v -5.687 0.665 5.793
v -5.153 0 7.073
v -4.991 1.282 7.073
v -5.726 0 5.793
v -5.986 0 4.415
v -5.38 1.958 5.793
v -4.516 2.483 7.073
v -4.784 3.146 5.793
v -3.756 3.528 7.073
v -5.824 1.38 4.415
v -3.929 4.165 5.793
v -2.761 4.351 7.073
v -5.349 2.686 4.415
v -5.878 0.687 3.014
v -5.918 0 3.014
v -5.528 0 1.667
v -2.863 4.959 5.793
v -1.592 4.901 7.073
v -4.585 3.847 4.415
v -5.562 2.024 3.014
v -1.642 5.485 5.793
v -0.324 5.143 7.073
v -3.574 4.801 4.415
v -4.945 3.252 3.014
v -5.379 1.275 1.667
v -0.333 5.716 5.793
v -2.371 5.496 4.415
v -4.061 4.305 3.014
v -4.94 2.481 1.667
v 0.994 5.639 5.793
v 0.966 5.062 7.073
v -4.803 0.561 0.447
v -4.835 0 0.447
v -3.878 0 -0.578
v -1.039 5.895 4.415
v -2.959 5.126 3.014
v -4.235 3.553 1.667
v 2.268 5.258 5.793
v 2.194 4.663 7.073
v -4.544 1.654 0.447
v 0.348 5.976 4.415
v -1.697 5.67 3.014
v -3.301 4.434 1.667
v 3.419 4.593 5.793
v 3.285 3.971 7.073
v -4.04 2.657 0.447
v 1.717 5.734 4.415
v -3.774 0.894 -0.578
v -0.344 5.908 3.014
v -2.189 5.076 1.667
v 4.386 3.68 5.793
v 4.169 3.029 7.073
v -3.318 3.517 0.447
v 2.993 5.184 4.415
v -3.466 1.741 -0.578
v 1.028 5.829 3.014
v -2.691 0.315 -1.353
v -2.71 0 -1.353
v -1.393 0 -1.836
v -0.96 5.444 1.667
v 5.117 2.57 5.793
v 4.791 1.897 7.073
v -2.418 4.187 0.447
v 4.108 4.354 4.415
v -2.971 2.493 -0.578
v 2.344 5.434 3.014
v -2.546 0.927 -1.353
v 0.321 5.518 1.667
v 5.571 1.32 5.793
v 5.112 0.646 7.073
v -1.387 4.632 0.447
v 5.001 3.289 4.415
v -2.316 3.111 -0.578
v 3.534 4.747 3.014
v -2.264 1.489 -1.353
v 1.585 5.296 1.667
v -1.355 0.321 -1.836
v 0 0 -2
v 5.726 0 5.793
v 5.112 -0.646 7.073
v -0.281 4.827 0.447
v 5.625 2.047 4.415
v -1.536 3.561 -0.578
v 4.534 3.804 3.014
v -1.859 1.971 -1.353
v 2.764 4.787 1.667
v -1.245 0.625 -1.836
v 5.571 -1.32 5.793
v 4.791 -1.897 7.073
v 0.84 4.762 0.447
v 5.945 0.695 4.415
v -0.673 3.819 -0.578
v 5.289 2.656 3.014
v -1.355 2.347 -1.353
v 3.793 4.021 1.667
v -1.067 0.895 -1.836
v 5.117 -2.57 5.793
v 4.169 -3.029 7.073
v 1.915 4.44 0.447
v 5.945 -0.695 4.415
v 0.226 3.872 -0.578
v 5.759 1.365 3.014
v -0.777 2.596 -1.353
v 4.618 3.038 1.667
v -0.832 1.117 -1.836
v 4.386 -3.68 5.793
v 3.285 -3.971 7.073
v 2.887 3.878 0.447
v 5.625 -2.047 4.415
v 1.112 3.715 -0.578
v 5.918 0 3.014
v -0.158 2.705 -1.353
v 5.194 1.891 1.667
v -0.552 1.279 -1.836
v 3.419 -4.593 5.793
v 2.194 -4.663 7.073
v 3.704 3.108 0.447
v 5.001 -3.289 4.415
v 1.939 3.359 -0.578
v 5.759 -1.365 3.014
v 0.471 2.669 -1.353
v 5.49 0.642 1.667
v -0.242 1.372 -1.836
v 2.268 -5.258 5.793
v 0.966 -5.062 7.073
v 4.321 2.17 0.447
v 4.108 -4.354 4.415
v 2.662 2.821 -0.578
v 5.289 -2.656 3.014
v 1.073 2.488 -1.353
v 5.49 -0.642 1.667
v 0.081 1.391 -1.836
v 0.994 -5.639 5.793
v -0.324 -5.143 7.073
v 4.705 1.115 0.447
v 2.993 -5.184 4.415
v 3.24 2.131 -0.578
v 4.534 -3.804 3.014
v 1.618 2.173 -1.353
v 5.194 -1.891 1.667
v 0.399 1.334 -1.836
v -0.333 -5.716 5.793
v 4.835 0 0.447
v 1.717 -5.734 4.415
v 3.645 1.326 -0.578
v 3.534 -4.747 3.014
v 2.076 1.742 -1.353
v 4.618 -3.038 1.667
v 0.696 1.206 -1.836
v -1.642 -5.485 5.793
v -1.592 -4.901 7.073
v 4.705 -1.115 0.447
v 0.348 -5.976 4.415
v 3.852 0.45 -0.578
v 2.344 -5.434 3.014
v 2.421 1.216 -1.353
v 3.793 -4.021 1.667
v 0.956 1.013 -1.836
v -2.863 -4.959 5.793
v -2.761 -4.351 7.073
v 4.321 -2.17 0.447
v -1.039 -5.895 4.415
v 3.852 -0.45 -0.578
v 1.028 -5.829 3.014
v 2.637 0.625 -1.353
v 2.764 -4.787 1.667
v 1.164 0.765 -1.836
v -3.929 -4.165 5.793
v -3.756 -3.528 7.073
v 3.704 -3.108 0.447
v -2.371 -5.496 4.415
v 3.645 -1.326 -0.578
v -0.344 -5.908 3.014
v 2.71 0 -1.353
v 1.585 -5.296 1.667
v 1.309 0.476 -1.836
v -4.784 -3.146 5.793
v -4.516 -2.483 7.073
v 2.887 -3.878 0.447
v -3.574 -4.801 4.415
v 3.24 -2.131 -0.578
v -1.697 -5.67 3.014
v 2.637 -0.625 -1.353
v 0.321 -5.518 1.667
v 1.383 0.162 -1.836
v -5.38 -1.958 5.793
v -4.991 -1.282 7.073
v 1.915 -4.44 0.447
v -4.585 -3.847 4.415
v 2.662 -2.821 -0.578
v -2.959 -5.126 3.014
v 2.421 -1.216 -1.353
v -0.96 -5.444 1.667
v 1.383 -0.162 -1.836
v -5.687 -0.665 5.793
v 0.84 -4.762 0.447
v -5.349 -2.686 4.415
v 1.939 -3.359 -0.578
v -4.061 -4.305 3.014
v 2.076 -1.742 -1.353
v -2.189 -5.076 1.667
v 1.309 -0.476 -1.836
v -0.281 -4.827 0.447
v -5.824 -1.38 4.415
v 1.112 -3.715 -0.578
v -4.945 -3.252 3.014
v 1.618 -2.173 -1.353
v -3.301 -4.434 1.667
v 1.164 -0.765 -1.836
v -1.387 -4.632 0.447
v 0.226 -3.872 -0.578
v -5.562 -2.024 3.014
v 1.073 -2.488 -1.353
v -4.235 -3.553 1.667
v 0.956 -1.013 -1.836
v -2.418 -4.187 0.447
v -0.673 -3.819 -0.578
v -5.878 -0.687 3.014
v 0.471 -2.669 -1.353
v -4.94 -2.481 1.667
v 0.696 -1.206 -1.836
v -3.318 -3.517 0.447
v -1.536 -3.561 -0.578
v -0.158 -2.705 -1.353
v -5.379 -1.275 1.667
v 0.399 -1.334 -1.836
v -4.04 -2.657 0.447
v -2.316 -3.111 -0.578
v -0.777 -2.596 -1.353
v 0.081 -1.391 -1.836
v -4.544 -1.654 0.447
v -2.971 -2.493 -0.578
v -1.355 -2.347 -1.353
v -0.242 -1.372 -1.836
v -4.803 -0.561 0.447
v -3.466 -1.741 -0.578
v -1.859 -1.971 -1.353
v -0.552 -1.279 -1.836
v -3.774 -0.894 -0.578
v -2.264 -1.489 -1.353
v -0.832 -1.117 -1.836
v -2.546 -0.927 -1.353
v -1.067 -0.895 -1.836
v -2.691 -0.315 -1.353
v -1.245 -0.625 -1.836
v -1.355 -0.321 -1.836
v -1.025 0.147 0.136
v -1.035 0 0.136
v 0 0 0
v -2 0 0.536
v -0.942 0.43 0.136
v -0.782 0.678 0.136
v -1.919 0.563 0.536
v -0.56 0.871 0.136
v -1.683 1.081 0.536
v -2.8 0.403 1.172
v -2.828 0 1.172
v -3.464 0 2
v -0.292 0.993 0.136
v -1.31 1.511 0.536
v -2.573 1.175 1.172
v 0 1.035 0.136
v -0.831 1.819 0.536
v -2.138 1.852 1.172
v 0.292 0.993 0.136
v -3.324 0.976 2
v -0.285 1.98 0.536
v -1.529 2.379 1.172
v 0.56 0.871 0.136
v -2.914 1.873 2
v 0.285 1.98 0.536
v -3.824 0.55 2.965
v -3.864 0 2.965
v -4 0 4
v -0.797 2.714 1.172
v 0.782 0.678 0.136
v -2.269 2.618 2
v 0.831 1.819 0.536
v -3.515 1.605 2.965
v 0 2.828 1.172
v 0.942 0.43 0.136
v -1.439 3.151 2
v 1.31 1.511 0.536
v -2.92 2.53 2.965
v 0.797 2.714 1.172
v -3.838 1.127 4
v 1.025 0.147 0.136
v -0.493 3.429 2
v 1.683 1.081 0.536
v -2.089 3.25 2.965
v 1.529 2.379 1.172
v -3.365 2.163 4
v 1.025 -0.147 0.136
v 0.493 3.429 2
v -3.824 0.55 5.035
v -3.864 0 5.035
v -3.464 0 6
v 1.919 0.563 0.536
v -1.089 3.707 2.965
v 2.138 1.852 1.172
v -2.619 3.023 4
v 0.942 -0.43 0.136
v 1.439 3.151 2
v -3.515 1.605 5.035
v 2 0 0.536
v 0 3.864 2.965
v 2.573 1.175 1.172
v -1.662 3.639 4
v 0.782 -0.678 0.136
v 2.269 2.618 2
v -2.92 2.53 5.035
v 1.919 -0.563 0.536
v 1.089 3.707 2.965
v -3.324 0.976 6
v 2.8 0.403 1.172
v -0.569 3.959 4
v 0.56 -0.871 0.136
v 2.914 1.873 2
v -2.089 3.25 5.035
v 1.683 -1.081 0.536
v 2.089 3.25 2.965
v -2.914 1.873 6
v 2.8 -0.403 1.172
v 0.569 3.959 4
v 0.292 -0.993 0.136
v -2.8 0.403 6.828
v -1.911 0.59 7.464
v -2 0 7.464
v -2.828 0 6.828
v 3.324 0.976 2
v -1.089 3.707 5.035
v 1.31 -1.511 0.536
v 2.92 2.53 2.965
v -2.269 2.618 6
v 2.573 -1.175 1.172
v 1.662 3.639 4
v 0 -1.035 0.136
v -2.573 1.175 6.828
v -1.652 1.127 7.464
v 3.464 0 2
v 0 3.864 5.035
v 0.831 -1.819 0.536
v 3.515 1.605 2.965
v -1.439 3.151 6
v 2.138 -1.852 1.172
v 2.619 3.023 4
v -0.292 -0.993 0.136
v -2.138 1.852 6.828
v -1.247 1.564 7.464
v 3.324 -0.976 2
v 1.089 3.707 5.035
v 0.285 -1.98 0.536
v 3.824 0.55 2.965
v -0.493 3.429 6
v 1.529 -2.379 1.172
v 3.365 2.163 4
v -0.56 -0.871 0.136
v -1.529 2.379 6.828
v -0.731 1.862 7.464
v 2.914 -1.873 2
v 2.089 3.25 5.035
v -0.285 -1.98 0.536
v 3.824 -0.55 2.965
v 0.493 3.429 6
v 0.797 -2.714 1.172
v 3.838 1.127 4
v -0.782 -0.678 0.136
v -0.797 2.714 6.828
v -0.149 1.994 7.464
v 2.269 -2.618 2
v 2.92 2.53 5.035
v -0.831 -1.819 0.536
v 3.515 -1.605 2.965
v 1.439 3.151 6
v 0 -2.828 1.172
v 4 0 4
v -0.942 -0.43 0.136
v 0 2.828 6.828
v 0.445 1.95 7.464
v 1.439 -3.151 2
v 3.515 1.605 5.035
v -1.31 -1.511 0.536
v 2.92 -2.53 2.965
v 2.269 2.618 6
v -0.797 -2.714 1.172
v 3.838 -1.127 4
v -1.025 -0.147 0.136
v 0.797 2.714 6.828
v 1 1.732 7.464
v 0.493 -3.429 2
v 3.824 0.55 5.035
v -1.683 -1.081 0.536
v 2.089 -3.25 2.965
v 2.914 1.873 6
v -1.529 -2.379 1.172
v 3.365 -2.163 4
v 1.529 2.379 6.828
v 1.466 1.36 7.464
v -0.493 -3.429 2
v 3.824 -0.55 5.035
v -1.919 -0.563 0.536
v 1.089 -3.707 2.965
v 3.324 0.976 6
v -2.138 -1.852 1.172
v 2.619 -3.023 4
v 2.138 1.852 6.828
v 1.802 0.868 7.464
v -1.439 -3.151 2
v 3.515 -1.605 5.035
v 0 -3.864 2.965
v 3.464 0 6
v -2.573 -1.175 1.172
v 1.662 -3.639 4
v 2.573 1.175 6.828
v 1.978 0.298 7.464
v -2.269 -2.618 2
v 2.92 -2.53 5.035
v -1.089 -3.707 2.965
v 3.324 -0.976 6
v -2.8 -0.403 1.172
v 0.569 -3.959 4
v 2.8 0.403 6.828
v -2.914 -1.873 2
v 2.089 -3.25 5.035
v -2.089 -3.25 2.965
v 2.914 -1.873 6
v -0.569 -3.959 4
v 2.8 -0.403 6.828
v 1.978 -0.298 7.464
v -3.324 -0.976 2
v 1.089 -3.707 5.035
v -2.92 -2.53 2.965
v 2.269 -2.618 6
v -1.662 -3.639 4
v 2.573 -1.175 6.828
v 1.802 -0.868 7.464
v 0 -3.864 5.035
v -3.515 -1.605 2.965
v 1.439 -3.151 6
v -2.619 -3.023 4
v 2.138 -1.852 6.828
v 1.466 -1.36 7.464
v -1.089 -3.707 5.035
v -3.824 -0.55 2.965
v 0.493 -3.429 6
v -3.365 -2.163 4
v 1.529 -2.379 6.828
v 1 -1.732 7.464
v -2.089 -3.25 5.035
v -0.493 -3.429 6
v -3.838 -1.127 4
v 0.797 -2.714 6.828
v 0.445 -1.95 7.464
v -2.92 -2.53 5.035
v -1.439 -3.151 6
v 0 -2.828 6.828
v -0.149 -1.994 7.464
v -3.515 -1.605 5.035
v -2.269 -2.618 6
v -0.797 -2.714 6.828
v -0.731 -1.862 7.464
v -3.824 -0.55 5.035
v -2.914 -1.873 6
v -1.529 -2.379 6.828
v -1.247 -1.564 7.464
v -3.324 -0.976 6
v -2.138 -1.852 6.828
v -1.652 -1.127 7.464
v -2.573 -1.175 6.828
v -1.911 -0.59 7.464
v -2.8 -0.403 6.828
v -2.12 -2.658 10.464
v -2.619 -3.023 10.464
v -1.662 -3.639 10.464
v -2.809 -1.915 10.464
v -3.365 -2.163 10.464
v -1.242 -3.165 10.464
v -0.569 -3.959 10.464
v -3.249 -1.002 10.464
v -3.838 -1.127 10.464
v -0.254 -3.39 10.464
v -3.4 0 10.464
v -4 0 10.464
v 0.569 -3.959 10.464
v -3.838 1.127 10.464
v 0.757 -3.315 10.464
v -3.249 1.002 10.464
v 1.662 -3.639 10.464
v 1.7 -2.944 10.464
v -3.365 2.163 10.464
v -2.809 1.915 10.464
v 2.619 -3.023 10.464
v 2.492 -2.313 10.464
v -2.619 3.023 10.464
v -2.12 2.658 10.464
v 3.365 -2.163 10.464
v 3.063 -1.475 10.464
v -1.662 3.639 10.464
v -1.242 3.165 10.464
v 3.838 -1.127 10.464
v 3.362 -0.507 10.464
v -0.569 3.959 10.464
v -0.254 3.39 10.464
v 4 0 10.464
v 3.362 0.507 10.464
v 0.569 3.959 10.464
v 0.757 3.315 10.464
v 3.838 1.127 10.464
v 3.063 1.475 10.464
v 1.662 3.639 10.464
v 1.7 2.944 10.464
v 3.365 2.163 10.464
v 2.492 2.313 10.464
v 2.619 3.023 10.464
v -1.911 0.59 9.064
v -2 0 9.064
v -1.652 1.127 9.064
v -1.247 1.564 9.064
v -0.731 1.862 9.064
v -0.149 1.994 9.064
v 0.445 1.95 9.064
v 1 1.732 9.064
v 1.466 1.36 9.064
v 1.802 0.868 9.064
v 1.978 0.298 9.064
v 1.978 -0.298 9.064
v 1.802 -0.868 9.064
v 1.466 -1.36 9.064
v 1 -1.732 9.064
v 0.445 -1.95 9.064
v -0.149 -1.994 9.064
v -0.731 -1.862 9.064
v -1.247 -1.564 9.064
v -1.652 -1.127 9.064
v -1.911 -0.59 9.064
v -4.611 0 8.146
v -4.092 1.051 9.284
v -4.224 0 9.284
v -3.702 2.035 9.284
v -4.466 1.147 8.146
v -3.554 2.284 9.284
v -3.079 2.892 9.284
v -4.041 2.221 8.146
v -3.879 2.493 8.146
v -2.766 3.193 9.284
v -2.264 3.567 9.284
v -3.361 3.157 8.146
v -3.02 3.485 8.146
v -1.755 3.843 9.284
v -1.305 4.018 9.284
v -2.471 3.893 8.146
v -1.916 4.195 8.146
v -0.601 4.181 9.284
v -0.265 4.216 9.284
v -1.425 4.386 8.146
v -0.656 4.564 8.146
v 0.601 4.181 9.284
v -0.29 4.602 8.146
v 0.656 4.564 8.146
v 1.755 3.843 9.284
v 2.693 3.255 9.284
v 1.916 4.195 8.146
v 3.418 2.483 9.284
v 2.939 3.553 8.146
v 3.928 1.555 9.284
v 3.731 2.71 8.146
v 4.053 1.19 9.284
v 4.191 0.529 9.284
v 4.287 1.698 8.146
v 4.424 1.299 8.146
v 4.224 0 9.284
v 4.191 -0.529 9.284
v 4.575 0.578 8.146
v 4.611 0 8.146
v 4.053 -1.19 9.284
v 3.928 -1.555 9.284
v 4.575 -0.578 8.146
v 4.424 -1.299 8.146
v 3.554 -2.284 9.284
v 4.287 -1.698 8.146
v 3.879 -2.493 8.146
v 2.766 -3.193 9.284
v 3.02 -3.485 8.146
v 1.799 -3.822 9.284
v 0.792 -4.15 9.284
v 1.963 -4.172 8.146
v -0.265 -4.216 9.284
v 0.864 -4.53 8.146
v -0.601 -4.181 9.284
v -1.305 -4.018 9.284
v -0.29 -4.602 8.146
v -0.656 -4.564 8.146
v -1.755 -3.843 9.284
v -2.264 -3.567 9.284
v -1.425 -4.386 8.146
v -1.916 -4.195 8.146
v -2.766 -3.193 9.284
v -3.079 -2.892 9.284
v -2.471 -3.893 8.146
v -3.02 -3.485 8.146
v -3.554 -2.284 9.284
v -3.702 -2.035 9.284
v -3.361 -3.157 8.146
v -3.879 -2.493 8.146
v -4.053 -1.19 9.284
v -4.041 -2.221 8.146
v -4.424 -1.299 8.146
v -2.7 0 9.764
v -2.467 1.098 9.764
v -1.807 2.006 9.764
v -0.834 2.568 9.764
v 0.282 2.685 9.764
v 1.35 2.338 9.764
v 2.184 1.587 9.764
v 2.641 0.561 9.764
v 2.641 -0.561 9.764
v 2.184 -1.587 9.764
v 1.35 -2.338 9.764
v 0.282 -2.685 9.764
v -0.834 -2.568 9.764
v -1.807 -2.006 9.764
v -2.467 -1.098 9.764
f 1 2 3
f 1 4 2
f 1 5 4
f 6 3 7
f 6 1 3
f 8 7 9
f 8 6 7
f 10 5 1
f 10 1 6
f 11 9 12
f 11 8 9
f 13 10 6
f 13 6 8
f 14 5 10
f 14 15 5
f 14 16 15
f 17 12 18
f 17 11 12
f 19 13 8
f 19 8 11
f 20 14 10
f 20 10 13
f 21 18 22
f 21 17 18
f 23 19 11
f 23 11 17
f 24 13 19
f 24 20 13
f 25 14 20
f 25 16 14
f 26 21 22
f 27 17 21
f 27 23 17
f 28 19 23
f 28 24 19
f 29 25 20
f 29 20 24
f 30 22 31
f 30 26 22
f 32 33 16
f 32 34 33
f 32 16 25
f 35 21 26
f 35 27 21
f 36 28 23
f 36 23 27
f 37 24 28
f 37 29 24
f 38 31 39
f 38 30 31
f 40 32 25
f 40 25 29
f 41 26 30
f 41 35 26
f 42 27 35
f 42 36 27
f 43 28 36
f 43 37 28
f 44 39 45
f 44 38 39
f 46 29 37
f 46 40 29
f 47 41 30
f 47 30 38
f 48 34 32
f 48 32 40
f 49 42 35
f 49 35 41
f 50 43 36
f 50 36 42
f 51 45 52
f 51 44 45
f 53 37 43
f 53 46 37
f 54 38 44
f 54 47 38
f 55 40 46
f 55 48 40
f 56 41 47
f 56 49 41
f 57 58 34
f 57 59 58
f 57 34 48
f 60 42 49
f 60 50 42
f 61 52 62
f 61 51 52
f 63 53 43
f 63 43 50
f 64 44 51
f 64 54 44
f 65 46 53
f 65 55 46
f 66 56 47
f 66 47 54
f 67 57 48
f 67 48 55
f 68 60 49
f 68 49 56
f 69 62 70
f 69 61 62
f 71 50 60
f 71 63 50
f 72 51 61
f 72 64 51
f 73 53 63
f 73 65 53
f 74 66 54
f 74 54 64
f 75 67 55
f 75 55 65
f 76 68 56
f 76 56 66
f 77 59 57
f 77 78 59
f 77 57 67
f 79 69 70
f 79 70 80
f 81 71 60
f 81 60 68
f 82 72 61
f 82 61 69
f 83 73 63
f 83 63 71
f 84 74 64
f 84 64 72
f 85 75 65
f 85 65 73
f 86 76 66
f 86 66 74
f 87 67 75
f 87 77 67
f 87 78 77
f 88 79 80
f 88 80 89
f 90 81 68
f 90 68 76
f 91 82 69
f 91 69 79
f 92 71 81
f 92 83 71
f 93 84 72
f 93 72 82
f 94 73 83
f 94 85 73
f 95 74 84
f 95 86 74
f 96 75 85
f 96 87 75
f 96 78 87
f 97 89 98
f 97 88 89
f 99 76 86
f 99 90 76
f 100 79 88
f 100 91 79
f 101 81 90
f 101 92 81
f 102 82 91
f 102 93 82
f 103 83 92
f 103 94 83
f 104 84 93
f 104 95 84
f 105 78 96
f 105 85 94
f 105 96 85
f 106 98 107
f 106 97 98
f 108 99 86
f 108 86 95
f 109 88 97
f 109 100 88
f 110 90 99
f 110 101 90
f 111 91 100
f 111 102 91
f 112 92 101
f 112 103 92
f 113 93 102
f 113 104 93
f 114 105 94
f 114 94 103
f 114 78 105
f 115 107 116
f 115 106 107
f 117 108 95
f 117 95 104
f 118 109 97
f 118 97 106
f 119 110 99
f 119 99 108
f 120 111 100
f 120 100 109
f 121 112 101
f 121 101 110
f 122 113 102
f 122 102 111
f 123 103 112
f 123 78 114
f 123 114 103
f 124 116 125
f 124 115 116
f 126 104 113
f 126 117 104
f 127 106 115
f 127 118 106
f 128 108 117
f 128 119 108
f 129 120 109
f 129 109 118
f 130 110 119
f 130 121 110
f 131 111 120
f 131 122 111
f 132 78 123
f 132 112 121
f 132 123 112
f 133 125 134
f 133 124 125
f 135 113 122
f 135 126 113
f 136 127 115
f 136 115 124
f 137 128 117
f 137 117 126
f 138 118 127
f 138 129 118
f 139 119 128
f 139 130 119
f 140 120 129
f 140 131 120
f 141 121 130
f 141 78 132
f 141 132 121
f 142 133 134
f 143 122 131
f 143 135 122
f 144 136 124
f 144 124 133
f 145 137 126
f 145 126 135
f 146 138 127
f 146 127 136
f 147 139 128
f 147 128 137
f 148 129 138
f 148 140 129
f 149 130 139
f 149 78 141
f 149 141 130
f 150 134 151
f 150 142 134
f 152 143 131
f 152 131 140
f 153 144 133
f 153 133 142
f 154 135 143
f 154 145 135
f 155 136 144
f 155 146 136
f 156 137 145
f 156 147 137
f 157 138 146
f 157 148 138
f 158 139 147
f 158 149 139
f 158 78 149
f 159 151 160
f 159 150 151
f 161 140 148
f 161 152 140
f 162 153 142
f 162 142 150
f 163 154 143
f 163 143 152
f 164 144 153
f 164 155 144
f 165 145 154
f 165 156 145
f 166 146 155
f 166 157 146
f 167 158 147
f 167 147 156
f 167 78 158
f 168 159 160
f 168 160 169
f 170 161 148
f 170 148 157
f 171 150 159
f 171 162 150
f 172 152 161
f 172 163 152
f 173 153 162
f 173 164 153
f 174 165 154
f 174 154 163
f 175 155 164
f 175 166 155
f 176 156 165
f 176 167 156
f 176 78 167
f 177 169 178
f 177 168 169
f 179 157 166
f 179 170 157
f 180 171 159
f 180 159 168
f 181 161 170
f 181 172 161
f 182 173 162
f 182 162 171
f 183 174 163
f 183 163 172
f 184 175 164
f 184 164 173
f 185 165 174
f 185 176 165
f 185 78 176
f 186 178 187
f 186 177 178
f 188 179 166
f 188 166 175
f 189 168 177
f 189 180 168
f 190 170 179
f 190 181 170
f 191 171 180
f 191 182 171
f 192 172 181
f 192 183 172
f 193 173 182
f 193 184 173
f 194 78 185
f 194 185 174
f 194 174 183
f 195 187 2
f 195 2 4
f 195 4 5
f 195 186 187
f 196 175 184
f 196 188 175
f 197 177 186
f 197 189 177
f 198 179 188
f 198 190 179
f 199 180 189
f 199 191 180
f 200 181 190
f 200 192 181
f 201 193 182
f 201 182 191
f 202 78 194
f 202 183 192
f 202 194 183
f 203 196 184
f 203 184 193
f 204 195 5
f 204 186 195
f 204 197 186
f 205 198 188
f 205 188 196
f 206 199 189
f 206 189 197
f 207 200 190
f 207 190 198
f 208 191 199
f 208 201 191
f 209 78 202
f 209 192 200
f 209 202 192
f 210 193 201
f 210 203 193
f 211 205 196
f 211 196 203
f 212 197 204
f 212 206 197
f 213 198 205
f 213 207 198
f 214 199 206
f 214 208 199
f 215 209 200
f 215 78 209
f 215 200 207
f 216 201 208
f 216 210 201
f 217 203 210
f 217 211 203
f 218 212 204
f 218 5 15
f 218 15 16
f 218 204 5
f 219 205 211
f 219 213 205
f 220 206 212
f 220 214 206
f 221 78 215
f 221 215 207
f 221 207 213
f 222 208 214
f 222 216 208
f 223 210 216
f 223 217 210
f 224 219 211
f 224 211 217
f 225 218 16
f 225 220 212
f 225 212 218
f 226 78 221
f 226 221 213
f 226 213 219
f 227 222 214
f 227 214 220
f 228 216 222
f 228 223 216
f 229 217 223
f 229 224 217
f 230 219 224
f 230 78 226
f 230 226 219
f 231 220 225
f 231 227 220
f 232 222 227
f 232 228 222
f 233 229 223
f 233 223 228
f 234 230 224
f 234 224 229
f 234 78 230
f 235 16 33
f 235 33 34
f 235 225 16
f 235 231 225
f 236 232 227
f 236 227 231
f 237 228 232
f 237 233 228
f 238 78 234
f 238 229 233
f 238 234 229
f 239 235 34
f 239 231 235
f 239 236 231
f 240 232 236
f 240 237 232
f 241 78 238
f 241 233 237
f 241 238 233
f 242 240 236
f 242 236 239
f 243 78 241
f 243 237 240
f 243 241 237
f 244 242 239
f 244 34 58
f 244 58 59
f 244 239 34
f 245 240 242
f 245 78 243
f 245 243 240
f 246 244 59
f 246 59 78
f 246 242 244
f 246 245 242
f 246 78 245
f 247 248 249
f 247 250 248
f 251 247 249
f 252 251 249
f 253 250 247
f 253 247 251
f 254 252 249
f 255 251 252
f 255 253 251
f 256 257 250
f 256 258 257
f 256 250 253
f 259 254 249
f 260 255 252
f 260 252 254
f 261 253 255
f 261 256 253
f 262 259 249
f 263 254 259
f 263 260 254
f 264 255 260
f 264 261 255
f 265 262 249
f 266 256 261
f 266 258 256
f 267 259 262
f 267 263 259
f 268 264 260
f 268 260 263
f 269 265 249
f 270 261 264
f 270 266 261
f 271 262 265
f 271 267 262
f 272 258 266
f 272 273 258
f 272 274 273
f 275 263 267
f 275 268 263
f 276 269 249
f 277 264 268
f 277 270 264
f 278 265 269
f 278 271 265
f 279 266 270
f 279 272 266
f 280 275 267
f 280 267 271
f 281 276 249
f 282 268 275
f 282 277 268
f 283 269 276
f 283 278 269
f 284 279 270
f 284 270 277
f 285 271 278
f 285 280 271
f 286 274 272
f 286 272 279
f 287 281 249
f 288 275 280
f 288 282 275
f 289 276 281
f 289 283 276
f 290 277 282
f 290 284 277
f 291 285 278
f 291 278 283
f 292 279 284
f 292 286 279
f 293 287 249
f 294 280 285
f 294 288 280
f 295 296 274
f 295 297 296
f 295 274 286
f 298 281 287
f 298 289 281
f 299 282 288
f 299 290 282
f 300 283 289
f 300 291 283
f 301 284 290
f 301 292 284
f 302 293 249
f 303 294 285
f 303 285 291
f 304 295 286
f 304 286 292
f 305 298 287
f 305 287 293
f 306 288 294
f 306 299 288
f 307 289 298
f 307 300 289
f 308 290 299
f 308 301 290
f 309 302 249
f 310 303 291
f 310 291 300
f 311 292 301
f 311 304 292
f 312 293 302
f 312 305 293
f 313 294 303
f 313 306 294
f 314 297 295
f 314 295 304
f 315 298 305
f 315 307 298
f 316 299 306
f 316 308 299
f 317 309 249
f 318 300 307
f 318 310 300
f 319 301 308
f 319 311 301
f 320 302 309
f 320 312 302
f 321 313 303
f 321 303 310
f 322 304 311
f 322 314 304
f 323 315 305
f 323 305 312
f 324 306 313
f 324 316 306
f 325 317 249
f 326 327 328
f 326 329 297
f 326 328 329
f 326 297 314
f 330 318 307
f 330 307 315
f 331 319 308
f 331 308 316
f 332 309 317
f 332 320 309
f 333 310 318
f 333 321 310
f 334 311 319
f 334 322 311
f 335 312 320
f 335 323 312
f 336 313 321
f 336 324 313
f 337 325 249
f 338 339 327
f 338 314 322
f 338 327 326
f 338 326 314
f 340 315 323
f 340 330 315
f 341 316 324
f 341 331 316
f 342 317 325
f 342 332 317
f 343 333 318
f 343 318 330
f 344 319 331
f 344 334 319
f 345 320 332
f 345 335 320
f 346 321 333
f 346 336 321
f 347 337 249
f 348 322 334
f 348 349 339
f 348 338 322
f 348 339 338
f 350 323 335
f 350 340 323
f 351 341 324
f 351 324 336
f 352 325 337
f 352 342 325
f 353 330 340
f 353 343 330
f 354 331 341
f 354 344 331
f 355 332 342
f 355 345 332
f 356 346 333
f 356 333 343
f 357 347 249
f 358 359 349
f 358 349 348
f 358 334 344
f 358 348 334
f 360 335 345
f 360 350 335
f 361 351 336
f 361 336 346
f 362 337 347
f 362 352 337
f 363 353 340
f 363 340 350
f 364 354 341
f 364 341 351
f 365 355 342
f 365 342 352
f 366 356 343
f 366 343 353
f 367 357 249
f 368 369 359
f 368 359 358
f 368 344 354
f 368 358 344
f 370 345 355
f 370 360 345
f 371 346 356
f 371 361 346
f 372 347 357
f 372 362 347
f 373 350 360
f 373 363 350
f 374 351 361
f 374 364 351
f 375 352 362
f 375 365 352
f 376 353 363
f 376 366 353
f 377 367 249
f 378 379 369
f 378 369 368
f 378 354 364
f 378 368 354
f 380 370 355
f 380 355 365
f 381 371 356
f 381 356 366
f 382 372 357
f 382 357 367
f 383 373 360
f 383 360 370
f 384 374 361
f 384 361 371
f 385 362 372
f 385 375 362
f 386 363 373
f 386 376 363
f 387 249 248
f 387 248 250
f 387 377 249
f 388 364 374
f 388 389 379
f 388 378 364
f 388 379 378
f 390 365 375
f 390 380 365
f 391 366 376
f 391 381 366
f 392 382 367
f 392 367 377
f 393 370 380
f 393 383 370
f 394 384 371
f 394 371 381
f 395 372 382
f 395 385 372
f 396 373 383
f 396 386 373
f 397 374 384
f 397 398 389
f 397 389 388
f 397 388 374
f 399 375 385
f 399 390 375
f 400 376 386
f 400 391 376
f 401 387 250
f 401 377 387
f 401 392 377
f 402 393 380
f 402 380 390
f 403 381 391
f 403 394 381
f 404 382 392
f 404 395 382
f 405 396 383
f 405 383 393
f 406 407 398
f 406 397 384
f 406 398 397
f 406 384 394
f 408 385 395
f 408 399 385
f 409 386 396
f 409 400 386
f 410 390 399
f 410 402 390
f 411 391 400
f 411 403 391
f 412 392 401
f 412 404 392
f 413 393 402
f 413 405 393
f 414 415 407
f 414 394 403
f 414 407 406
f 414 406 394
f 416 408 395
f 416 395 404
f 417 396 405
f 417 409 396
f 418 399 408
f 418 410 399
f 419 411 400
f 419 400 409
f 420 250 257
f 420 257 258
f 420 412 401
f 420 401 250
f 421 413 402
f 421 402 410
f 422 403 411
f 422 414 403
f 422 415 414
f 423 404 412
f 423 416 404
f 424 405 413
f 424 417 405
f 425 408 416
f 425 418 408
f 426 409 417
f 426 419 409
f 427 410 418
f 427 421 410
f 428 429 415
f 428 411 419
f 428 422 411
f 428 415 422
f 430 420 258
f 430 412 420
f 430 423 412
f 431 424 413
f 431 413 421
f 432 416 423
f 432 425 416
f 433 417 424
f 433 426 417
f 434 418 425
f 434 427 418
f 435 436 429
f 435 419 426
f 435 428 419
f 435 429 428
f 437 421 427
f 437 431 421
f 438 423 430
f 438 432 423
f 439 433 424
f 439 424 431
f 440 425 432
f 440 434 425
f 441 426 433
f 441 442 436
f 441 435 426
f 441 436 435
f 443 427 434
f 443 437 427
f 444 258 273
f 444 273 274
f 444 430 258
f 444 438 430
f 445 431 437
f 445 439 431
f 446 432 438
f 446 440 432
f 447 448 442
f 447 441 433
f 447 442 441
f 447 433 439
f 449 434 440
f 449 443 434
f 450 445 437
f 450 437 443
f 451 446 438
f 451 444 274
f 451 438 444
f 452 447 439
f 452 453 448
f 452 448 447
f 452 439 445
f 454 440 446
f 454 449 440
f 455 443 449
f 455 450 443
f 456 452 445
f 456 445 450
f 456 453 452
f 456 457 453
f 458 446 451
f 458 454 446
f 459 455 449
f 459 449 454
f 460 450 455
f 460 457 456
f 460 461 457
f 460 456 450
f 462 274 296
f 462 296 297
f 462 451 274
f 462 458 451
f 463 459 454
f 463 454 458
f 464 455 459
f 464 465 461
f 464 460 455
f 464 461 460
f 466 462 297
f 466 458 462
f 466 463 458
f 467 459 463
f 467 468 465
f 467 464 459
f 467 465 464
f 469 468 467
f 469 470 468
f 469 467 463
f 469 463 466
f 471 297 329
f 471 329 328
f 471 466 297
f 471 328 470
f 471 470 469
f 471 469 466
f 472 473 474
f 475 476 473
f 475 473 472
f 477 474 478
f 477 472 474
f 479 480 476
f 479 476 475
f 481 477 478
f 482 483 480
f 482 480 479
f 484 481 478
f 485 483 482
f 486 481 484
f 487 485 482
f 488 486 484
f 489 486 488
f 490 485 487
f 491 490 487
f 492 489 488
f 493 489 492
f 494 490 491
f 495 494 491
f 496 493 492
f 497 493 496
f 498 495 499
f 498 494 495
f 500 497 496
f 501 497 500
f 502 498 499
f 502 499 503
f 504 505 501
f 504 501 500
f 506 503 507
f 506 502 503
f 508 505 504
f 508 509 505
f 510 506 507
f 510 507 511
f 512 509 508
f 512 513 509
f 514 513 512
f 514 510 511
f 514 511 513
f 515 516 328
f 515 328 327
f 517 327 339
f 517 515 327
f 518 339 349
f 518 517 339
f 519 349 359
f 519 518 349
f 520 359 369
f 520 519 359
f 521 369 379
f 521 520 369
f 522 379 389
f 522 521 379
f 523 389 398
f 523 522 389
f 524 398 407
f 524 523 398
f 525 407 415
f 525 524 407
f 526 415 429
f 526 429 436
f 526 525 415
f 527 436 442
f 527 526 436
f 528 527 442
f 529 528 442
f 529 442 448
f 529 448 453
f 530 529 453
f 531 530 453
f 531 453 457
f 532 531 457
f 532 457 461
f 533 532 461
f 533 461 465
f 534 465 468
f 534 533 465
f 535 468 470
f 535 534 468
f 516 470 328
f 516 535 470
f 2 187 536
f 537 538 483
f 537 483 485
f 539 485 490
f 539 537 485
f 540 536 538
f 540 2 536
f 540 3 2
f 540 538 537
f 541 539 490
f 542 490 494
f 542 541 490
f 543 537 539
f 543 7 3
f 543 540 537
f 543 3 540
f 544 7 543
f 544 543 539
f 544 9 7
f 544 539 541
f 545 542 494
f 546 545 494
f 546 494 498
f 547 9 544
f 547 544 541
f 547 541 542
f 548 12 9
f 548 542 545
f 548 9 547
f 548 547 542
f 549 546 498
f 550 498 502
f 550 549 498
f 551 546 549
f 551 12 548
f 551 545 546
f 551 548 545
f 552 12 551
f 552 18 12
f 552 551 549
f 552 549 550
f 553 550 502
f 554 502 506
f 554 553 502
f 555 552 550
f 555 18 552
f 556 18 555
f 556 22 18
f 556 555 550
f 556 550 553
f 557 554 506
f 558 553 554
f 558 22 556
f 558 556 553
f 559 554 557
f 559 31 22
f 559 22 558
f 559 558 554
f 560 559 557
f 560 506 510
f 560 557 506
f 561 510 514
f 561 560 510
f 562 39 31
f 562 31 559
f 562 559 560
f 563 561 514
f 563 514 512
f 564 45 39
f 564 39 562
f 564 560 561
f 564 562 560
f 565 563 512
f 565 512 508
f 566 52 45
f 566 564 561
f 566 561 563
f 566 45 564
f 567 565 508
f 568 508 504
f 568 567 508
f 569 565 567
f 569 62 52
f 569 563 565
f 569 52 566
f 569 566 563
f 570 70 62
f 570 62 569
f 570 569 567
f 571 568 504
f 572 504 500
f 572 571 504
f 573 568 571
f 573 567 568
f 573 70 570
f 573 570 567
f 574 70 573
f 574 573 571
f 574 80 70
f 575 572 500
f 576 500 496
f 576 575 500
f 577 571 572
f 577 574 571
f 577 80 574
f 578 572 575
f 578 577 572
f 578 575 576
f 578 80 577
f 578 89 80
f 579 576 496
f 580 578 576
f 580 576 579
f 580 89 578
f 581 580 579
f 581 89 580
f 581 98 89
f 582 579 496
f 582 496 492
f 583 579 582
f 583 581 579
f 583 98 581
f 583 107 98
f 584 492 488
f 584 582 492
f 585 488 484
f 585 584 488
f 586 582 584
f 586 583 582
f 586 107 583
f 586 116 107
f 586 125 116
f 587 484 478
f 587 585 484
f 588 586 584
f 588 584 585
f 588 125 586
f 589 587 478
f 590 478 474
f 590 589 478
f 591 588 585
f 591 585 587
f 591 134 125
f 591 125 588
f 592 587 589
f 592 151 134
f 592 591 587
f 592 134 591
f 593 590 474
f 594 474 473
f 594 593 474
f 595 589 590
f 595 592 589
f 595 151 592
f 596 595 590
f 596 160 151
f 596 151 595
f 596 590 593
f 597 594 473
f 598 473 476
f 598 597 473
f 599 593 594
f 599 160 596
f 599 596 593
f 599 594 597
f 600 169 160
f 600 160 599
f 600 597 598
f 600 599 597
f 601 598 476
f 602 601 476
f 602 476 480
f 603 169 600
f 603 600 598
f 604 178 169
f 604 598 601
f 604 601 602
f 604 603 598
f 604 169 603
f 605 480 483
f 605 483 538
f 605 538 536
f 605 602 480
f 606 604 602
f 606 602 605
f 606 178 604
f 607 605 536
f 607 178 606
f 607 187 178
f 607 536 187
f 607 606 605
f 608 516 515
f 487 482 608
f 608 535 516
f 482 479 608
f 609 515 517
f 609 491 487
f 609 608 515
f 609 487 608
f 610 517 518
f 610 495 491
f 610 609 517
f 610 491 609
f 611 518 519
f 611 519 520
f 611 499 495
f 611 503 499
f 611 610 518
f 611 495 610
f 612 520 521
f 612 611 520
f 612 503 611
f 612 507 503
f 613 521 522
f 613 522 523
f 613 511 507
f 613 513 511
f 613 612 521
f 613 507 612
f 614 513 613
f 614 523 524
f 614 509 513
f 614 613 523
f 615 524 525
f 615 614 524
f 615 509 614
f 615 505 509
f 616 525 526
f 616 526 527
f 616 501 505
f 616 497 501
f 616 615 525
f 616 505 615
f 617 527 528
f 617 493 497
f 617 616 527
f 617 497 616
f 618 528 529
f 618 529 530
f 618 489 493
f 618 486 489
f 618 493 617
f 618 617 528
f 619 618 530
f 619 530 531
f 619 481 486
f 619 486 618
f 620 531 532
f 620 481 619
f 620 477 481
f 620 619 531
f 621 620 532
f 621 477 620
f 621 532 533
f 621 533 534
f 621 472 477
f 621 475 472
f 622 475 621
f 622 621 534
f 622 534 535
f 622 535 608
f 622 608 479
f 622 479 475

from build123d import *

# Parameters (mm, degrees)
F2_SIZE = 1.4


# Not quite as in the source:
# - a fillet or chamfer that OpenCascade refuses, or shapes differently, is made with other operations: its cross-section is extruded or revolved along the edge and cut away or added


with BuildPart() as f1:
    # F0 (on Front) → F1 (revolve)
    with BuildSketch(Plane.XZ):
        with BuildLine():
            ThreePointArc((0, 0), (-3.8637033052, 2.9647238196), (-2, 7.4641016151))
            Line((-2, 7.4641016151), (-2, 10.4641016151))
            Line((-2, 10.4641016151), (-4, 10.4641016151))
            Line((-4, 10.4641016151), (-4, 8.472135955))
            ThreePointArc((-4, 8.472135955), (-5.6050341538, 1.8590674614), (0, -2))
            Line((0, -2), (0, 0))
        make_face()
    revolve(axis=Axis((0, 0, -1), (0, 0, -1)))

    # F2
    f2_edges = [f1.edges().sort_by_distance(p)[0] for p in [
        (2, 0, 10.464102),
    ]]
    chamfer(f2_edges, length=F2_SIZE)

    # F3: fillet of radius 8.5913249715 on 1 edges, made by hand

    # F3_s1 → F3_t2 (revolve)
    with BuildSketch(Plane.XZ):
        with BuildLine():
            ThreePointArc((-4, 10.4641016151), (-4.397901087, 8.7079815946), (-5.1530970812, 7.0733679363))
            ThreePointArc((-5.1530970812, 7.0733679363), (-4.6296797445, 7.8165515145), (-4, 8.472135955))
            Line((-4, 8.472135955), (-4, 10.4641016151))
        make_face()
    revolve(axis=Axis((0, 0, 8.472135955), (0, 0, -1)))


solid = f1.part
